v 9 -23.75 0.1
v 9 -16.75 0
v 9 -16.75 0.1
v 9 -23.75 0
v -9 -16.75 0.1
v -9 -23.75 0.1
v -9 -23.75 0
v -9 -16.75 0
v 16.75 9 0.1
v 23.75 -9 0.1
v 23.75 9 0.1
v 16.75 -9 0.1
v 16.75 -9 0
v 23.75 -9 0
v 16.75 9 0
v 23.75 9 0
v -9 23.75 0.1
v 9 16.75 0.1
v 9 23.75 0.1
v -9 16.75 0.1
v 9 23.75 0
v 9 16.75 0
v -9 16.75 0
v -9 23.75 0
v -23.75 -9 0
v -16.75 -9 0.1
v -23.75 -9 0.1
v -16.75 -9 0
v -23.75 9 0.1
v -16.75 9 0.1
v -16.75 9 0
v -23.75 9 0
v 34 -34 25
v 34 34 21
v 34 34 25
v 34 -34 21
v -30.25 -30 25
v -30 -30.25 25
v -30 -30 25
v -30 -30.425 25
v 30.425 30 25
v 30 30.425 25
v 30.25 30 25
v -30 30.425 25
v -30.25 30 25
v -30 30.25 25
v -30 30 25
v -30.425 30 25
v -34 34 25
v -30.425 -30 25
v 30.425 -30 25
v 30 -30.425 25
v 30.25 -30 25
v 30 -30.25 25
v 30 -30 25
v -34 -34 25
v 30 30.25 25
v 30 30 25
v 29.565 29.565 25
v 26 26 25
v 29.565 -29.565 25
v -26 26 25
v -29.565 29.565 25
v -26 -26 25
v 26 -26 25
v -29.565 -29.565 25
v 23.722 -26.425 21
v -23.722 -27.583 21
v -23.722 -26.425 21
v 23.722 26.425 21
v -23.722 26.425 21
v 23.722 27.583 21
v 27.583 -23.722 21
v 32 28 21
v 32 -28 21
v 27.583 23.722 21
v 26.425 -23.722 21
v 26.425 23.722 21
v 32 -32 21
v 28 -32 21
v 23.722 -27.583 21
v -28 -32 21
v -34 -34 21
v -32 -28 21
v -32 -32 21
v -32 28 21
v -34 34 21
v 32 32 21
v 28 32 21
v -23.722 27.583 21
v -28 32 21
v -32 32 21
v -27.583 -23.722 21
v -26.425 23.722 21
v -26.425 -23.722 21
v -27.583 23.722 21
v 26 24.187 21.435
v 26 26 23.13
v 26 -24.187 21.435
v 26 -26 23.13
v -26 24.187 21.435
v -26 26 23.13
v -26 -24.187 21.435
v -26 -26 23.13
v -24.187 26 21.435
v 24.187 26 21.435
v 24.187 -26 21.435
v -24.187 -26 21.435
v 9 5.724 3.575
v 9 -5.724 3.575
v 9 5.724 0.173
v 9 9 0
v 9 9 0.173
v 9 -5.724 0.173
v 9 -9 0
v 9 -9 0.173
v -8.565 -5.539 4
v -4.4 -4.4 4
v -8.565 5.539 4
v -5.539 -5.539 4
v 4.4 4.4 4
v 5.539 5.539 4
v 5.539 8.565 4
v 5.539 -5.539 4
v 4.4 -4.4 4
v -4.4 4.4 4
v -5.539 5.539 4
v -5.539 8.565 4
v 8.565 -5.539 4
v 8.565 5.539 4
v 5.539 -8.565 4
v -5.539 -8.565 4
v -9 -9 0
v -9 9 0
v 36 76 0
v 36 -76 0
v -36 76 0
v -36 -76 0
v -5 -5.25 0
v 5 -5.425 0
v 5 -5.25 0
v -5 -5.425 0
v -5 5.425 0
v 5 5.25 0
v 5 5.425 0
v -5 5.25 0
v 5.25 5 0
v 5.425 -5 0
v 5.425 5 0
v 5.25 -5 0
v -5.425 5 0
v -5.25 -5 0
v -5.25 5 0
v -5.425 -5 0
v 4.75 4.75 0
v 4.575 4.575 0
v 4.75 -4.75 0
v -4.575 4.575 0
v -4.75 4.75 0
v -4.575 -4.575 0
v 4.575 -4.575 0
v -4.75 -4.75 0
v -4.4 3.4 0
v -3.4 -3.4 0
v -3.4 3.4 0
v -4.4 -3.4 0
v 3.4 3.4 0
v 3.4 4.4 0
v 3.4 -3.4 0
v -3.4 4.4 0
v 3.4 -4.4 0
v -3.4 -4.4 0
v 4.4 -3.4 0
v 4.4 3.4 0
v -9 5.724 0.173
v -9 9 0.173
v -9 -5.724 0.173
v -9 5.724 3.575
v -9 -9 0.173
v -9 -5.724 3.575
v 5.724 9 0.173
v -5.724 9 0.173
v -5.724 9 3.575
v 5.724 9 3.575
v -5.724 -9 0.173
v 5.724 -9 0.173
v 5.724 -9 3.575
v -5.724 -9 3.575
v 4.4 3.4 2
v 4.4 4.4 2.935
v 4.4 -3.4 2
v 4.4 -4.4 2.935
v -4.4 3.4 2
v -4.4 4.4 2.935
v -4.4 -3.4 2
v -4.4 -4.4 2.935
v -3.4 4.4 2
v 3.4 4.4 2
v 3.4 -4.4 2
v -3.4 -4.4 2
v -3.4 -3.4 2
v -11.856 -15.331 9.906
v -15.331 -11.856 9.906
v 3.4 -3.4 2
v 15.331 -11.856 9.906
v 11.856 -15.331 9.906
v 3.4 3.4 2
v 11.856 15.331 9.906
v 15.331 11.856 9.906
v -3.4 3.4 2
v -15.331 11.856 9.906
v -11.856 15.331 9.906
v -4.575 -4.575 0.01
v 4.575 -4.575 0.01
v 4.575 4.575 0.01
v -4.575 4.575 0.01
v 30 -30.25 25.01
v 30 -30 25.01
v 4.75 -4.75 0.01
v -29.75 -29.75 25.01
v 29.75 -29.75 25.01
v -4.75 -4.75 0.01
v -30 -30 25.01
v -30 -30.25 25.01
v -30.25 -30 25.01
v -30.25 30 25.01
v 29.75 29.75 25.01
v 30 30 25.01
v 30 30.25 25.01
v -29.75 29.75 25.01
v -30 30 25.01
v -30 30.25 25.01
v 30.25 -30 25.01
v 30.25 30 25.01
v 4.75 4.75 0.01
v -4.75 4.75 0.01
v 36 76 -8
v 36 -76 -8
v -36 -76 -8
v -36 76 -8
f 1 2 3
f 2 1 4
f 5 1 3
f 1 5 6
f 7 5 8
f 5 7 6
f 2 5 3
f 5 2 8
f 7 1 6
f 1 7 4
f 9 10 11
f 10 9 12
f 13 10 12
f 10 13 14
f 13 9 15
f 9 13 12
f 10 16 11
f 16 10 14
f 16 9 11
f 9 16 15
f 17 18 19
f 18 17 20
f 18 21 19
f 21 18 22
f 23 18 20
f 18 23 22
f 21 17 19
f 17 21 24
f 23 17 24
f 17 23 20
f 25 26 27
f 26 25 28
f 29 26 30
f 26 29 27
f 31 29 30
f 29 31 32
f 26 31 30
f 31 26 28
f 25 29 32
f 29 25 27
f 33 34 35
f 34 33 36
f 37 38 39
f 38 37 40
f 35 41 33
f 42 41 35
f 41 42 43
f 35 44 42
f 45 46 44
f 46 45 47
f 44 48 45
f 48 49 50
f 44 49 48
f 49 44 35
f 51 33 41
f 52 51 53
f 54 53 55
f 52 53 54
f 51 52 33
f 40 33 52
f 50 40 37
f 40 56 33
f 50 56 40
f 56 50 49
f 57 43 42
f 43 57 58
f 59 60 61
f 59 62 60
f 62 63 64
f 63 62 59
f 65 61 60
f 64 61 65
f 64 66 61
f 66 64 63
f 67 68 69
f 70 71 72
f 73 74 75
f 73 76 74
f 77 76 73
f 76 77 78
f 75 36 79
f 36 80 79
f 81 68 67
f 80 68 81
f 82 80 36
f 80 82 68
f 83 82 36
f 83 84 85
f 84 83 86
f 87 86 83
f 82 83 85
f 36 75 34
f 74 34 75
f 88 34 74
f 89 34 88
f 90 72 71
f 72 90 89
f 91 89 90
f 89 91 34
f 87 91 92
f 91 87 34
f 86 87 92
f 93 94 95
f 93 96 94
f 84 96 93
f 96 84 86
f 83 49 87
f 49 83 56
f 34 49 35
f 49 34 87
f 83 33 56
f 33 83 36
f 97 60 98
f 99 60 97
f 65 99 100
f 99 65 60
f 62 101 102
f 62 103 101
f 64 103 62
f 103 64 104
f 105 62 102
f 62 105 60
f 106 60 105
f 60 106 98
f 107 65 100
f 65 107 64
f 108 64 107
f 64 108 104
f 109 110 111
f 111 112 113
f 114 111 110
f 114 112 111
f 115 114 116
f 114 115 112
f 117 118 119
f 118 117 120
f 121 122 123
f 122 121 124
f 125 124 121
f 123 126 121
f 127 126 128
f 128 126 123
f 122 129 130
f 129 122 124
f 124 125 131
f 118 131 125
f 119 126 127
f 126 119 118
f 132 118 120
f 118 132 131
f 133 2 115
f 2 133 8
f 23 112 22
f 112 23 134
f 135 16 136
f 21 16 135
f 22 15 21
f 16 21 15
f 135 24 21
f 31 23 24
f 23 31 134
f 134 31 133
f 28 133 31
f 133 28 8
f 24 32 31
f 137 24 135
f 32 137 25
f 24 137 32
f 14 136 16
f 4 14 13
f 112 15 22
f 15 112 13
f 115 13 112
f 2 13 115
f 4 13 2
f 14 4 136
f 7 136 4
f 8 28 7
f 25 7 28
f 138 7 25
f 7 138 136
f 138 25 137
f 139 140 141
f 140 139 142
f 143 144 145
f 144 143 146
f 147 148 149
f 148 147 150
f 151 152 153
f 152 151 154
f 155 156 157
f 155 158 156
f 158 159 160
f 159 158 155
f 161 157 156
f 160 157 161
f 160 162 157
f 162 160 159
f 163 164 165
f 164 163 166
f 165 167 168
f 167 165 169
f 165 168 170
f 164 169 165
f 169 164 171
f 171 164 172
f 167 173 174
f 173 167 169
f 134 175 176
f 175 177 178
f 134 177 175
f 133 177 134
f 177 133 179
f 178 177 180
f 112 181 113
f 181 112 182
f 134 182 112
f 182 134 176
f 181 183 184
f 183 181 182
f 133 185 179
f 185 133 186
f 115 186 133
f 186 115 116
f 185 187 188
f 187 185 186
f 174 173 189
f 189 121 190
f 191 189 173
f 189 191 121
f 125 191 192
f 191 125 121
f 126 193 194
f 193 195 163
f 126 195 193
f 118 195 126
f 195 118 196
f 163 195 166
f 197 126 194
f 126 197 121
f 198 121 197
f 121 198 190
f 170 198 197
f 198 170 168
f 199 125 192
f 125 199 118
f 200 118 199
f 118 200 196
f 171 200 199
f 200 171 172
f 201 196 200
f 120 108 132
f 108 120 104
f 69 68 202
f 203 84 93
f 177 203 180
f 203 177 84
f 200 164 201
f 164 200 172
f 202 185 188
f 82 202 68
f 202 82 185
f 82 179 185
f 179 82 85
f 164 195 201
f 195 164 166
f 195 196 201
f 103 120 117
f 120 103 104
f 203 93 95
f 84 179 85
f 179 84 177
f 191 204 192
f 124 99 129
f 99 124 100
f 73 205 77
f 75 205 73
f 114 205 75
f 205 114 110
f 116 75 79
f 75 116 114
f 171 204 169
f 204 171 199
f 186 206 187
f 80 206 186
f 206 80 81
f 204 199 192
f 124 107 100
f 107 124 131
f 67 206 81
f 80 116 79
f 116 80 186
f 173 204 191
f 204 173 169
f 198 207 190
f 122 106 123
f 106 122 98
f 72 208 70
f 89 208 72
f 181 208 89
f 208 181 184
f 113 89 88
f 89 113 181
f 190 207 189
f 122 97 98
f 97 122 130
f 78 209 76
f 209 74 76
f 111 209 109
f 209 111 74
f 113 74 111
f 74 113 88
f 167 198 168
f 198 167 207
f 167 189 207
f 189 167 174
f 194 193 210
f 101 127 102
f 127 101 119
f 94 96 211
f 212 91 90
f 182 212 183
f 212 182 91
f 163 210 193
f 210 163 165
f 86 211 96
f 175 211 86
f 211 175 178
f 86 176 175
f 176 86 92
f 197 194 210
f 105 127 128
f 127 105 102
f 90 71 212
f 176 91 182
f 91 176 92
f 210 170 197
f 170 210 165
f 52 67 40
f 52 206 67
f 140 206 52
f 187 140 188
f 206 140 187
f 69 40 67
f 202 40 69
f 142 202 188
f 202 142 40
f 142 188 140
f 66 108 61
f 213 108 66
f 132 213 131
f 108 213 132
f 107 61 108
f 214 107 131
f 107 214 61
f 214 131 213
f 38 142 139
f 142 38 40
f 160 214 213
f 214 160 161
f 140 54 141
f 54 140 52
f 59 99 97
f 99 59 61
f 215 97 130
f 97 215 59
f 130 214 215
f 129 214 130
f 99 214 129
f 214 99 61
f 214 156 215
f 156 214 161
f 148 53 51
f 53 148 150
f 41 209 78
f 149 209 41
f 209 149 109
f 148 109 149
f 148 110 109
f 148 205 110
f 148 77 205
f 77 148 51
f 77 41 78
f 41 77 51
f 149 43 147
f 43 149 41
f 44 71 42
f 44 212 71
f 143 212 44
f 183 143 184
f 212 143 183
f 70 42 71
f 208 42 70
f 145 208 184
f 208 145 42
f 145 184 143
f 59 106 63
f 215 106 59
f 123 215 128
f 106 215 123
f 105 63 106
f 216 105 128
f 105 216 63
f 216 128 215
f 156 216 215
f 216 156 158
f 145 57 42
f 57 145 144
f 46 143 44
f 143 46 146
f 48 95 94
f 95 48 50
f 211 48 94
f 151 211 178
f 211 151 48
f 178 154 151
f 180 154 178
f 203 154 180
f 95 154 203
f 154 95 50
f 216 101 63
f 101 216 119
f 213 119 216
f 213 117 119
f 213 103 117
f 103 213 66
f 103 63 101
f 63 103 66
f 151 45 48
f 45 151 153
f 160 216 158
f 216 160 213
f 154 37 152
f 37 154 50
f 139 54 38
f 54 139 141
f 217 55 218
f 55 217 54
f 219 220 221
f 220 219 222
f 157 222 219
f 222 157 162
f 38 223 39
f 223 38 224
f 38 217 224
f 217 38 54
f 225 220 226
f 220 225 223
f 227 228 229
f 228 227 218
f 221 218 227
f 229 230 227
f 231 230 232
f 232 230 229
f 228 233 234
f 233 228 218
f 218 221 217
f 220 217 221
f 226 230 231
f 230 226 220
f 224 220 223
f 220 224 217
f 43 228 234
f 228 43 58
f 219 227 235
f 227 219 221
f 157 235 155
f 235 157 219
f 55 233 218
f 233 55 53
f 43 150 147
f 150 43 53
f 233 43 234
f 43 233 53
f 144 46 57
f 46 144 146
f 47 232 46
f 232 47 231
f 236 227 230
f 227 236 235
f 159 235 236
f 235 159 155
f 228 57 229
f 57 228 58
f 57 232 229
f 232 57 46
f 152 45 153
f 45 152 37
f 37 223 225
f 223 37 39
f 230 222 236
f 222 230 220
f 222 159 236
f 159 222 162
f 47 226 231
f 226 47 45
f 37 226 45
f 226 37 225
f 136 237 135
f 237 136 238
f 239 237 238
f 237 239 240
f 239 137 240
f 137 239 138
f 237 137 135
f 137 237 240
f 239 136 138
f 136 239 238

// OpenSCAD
// G-Mini Home - piramide de Pepper: marco imprimible y vista de conjunto.
//
// Las caras son laminas (PET o acrilico) cortadas con las plantillas de
// hardware/templates/. Este marco las sostiene a 45 grados sin pegamento:
//   part = "frame"    marco con ranuras (imprimir boca abajo, sin soportes)
//   part = "assembly" marco + laminas + pantalla (renders)
//
// Medidas por defecto: telefono de 6,1" (b = 60, a = 10). Para otra pantalla
// usa los valores de hardware/templates/README.md, p. ej. tablet de 10,1":
//   openscad -D b=128 -D a=21 -D sheet=0.75 -D 'part="frame"' -o marco.stl pepper_pyramid.scad
//
// Licencia: CC BY-SA 4.0 (ver LICENSE-hardware.md)

part = "assembly";            // [frame, assembly]

b = 60;                       // lado mayor (arriba)
a = 10;                       // lado menor (sobre la pantalla)
sheet = 0.5;                  // espesor de la lamina
slot_clear = 0.35;            // juego de la ranura
bar = 4;                      // ancho de las barras del marco
screen = [72, 152, 8];        // telefono de referencia para el render

$fn = 32;
eps = 0.01;
H = (b - a) / 2;              // altura (caras a 45 grados)

// Plano de una cara: trapecio inclinado 45 grados hacia afuera, del lado -y.
module face_plane(thick) {
  hull() {
    translate([-a / 2, -a / 2 - thick / 2, 0]) cube([a, thick, eps]);
    translate([-b / 2, -b / 2 - thick / 2, H]) cube([b, thick, eps]);
  }
}

// Ranura: la cara engrosada al espesor de la lamina mas el juego.
module slot() {
  face_plane(sheet + slot_clear);
}

module top_ring() {
  translate([0, 0, H - bar]) difference() {
    translate([-b / 2 - bar, -b / 2 - bar, 0]) cube([b + 2 * bar, b + 2 * bar, bar]);
    translate([-b / 2 + bar, -b / 2 + bar, -eps]) cube([b - 2 * bar, b - 2 * bar, bar + 2 * eps]);
  }
}

module bottom_ring() {
  difference() {
    translate([-a / 2 - bar, -a / 2 - bar, 0]) cube([a + 2 * bar, a + 2 * bar, bar]);
    translate([-a / 2 + 0.6, -a / 2 + 0.6, -eps]) cube([a - 1.2, a - 1.2, bar + 2 * eps]);
  }
}

// Aristas de la piramide: postes que unen los dos aros.
module edges() {
  for (r = [0, 90, 180, 270]) rotate(r)
    hull() {
      translate([-a / 2, -a / 2, 0]) cube([bar * 0.8, bar * 0.8, bar], center = true);
      translate([-b / 2, -b / 2, H - bar / 2]) cube([bar, bar, bar], center = true);
    }
}

module frame() {
  difference() {
    union() {
      top_ring();
      bottom_ring();
      edges();
    }
    for (r = [0, 90, 180, 270]) rotate(r) slot();
  }
}

module sheets() {
  for (r = [0, 90, 180, 270]) rotate(r) face_plane(sheet);
}

if (part == "frame") {
  frame();
} else {
  color("#1b2631") translate([-screen[0] / 2, -screen[1] / 2, -screen[2]]) cube(screen);
  color("#3fe0ff") for (r = [0, 90, 180, 270]) rotate(r) translate([-9, -a / 2 - H * 0.75, -0.2]) cube([18, 7, 0.3]);
  color("#e6eef2") frame();
  color("#bfefff", 0.35) sheets();
}
